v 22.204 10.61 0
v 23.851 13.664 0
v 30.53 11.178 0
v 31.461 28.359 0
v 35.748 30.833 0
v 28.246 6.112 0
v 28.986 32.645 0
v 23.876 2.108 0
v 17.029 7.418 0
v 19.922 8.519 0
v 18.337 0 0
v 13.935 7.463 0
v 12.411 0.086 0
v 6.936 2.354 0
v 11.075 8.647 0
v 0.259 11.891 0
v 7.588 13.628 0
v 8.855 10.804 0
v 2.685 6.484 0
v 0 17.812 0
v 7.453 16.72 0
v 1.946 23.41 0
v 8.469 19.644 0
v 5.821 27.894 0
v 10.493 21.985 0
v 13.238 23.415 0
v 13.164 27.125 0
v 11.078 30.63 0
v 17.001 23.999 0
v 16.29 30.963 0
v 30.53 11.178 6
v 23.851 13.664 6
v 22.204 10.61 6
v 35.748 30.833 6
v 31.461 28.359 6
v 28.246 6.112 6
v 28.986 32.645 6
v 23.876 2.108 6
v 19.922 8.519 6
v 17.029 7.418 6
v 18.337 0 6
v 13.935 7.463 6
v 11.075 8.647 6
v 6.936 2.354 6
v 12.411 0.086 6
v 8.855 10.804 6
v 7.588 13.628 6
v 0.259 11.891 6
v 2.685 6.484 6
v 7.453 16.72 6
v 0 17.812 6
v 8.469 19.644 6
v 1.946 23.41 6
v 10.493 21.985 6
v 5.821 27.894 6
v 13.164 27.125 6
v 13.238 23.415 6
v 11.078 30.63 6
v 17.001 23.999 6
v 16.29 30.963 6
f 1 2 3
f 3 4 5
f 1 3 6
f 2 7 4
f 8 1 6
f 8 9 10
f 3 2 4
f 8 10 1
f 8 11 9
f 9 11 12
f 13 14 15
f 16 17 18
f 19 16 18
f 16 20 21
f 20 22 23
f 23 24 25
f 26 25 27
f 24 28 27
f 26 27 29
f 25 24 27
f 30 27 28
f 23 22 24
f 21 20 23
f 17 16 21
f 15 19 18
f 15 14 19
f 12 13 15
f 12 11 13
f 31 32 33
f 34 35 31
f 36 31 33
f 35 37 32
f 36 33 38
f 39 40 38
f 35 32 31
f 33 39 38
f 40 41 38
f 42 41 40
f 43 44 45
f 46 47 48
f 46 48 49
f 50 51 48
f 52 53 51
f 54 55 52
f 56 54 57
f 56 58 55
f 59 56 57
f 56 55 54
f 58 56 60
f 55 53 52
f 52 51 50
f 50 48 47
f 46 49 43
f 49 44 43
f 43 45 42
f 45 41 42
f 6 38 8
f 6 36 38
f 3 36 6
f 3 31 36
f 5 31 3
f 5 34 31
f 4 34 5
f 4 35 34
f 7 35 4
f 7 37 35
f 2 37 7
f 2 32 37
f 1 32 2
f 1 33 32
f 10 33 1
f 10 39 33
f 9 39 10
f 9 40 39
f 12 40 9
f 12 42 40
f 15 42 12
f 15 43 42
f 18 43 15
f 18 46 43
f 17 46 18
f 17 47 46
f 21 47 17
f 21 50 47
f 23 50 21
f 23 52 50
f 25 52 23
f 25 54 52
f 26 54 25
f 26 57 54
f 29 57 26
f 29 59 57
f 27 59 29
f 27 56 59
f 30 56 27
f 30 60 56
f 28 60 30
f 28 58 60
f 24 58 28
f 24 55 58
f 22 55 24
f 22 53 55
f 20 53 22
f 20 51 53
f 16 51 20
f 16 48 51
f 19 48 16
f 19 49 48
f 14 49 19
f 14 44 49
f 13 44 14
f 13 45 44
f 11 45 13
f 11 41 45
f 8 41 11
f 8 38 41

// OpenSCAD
$fn = 32;

// ----------------------------------------------------------------------
// Eye lug: ring_tail, 6 mm thick
// ----------------------------------------------------------------------

// --- parameters (mm) ---
profile_height = 6;       // extrusion height
profile_points = 30;      // points of the closed outline

profile = [[13.164, 27.125], [16.29, 30.963], [11.078, 30.63], [5.821, 27.894], [1.946, 23.41], [0, 17.812], [0.259, 11.891], [2.685, 6.484], [6.936, 2.354], [12.411, 0.086], [18.337, 0], [23.876, 2.108], [28.246, 6.112], [30.53, 11.178], [35.748, 30.833], [31.461, 28.359], [28.986, 32.645], [23.851, 13.664], [22.204, 10.61], [19.922, 8.519], [17.029, 7.418], [13.935, 7.463], [11.075, 8.647], [8.855, 10.804], [7.588, 13.628], [7.453, 16.72], [8.469, 19.644], [10.493, 21.985], [13.238, 23.415], [17.001, 23.999]];  // single closed polygon, 30 points, counter clockwise

// --- the one profile operation ---
linear_extrude(height = profile_height) polygon(points = profile);
